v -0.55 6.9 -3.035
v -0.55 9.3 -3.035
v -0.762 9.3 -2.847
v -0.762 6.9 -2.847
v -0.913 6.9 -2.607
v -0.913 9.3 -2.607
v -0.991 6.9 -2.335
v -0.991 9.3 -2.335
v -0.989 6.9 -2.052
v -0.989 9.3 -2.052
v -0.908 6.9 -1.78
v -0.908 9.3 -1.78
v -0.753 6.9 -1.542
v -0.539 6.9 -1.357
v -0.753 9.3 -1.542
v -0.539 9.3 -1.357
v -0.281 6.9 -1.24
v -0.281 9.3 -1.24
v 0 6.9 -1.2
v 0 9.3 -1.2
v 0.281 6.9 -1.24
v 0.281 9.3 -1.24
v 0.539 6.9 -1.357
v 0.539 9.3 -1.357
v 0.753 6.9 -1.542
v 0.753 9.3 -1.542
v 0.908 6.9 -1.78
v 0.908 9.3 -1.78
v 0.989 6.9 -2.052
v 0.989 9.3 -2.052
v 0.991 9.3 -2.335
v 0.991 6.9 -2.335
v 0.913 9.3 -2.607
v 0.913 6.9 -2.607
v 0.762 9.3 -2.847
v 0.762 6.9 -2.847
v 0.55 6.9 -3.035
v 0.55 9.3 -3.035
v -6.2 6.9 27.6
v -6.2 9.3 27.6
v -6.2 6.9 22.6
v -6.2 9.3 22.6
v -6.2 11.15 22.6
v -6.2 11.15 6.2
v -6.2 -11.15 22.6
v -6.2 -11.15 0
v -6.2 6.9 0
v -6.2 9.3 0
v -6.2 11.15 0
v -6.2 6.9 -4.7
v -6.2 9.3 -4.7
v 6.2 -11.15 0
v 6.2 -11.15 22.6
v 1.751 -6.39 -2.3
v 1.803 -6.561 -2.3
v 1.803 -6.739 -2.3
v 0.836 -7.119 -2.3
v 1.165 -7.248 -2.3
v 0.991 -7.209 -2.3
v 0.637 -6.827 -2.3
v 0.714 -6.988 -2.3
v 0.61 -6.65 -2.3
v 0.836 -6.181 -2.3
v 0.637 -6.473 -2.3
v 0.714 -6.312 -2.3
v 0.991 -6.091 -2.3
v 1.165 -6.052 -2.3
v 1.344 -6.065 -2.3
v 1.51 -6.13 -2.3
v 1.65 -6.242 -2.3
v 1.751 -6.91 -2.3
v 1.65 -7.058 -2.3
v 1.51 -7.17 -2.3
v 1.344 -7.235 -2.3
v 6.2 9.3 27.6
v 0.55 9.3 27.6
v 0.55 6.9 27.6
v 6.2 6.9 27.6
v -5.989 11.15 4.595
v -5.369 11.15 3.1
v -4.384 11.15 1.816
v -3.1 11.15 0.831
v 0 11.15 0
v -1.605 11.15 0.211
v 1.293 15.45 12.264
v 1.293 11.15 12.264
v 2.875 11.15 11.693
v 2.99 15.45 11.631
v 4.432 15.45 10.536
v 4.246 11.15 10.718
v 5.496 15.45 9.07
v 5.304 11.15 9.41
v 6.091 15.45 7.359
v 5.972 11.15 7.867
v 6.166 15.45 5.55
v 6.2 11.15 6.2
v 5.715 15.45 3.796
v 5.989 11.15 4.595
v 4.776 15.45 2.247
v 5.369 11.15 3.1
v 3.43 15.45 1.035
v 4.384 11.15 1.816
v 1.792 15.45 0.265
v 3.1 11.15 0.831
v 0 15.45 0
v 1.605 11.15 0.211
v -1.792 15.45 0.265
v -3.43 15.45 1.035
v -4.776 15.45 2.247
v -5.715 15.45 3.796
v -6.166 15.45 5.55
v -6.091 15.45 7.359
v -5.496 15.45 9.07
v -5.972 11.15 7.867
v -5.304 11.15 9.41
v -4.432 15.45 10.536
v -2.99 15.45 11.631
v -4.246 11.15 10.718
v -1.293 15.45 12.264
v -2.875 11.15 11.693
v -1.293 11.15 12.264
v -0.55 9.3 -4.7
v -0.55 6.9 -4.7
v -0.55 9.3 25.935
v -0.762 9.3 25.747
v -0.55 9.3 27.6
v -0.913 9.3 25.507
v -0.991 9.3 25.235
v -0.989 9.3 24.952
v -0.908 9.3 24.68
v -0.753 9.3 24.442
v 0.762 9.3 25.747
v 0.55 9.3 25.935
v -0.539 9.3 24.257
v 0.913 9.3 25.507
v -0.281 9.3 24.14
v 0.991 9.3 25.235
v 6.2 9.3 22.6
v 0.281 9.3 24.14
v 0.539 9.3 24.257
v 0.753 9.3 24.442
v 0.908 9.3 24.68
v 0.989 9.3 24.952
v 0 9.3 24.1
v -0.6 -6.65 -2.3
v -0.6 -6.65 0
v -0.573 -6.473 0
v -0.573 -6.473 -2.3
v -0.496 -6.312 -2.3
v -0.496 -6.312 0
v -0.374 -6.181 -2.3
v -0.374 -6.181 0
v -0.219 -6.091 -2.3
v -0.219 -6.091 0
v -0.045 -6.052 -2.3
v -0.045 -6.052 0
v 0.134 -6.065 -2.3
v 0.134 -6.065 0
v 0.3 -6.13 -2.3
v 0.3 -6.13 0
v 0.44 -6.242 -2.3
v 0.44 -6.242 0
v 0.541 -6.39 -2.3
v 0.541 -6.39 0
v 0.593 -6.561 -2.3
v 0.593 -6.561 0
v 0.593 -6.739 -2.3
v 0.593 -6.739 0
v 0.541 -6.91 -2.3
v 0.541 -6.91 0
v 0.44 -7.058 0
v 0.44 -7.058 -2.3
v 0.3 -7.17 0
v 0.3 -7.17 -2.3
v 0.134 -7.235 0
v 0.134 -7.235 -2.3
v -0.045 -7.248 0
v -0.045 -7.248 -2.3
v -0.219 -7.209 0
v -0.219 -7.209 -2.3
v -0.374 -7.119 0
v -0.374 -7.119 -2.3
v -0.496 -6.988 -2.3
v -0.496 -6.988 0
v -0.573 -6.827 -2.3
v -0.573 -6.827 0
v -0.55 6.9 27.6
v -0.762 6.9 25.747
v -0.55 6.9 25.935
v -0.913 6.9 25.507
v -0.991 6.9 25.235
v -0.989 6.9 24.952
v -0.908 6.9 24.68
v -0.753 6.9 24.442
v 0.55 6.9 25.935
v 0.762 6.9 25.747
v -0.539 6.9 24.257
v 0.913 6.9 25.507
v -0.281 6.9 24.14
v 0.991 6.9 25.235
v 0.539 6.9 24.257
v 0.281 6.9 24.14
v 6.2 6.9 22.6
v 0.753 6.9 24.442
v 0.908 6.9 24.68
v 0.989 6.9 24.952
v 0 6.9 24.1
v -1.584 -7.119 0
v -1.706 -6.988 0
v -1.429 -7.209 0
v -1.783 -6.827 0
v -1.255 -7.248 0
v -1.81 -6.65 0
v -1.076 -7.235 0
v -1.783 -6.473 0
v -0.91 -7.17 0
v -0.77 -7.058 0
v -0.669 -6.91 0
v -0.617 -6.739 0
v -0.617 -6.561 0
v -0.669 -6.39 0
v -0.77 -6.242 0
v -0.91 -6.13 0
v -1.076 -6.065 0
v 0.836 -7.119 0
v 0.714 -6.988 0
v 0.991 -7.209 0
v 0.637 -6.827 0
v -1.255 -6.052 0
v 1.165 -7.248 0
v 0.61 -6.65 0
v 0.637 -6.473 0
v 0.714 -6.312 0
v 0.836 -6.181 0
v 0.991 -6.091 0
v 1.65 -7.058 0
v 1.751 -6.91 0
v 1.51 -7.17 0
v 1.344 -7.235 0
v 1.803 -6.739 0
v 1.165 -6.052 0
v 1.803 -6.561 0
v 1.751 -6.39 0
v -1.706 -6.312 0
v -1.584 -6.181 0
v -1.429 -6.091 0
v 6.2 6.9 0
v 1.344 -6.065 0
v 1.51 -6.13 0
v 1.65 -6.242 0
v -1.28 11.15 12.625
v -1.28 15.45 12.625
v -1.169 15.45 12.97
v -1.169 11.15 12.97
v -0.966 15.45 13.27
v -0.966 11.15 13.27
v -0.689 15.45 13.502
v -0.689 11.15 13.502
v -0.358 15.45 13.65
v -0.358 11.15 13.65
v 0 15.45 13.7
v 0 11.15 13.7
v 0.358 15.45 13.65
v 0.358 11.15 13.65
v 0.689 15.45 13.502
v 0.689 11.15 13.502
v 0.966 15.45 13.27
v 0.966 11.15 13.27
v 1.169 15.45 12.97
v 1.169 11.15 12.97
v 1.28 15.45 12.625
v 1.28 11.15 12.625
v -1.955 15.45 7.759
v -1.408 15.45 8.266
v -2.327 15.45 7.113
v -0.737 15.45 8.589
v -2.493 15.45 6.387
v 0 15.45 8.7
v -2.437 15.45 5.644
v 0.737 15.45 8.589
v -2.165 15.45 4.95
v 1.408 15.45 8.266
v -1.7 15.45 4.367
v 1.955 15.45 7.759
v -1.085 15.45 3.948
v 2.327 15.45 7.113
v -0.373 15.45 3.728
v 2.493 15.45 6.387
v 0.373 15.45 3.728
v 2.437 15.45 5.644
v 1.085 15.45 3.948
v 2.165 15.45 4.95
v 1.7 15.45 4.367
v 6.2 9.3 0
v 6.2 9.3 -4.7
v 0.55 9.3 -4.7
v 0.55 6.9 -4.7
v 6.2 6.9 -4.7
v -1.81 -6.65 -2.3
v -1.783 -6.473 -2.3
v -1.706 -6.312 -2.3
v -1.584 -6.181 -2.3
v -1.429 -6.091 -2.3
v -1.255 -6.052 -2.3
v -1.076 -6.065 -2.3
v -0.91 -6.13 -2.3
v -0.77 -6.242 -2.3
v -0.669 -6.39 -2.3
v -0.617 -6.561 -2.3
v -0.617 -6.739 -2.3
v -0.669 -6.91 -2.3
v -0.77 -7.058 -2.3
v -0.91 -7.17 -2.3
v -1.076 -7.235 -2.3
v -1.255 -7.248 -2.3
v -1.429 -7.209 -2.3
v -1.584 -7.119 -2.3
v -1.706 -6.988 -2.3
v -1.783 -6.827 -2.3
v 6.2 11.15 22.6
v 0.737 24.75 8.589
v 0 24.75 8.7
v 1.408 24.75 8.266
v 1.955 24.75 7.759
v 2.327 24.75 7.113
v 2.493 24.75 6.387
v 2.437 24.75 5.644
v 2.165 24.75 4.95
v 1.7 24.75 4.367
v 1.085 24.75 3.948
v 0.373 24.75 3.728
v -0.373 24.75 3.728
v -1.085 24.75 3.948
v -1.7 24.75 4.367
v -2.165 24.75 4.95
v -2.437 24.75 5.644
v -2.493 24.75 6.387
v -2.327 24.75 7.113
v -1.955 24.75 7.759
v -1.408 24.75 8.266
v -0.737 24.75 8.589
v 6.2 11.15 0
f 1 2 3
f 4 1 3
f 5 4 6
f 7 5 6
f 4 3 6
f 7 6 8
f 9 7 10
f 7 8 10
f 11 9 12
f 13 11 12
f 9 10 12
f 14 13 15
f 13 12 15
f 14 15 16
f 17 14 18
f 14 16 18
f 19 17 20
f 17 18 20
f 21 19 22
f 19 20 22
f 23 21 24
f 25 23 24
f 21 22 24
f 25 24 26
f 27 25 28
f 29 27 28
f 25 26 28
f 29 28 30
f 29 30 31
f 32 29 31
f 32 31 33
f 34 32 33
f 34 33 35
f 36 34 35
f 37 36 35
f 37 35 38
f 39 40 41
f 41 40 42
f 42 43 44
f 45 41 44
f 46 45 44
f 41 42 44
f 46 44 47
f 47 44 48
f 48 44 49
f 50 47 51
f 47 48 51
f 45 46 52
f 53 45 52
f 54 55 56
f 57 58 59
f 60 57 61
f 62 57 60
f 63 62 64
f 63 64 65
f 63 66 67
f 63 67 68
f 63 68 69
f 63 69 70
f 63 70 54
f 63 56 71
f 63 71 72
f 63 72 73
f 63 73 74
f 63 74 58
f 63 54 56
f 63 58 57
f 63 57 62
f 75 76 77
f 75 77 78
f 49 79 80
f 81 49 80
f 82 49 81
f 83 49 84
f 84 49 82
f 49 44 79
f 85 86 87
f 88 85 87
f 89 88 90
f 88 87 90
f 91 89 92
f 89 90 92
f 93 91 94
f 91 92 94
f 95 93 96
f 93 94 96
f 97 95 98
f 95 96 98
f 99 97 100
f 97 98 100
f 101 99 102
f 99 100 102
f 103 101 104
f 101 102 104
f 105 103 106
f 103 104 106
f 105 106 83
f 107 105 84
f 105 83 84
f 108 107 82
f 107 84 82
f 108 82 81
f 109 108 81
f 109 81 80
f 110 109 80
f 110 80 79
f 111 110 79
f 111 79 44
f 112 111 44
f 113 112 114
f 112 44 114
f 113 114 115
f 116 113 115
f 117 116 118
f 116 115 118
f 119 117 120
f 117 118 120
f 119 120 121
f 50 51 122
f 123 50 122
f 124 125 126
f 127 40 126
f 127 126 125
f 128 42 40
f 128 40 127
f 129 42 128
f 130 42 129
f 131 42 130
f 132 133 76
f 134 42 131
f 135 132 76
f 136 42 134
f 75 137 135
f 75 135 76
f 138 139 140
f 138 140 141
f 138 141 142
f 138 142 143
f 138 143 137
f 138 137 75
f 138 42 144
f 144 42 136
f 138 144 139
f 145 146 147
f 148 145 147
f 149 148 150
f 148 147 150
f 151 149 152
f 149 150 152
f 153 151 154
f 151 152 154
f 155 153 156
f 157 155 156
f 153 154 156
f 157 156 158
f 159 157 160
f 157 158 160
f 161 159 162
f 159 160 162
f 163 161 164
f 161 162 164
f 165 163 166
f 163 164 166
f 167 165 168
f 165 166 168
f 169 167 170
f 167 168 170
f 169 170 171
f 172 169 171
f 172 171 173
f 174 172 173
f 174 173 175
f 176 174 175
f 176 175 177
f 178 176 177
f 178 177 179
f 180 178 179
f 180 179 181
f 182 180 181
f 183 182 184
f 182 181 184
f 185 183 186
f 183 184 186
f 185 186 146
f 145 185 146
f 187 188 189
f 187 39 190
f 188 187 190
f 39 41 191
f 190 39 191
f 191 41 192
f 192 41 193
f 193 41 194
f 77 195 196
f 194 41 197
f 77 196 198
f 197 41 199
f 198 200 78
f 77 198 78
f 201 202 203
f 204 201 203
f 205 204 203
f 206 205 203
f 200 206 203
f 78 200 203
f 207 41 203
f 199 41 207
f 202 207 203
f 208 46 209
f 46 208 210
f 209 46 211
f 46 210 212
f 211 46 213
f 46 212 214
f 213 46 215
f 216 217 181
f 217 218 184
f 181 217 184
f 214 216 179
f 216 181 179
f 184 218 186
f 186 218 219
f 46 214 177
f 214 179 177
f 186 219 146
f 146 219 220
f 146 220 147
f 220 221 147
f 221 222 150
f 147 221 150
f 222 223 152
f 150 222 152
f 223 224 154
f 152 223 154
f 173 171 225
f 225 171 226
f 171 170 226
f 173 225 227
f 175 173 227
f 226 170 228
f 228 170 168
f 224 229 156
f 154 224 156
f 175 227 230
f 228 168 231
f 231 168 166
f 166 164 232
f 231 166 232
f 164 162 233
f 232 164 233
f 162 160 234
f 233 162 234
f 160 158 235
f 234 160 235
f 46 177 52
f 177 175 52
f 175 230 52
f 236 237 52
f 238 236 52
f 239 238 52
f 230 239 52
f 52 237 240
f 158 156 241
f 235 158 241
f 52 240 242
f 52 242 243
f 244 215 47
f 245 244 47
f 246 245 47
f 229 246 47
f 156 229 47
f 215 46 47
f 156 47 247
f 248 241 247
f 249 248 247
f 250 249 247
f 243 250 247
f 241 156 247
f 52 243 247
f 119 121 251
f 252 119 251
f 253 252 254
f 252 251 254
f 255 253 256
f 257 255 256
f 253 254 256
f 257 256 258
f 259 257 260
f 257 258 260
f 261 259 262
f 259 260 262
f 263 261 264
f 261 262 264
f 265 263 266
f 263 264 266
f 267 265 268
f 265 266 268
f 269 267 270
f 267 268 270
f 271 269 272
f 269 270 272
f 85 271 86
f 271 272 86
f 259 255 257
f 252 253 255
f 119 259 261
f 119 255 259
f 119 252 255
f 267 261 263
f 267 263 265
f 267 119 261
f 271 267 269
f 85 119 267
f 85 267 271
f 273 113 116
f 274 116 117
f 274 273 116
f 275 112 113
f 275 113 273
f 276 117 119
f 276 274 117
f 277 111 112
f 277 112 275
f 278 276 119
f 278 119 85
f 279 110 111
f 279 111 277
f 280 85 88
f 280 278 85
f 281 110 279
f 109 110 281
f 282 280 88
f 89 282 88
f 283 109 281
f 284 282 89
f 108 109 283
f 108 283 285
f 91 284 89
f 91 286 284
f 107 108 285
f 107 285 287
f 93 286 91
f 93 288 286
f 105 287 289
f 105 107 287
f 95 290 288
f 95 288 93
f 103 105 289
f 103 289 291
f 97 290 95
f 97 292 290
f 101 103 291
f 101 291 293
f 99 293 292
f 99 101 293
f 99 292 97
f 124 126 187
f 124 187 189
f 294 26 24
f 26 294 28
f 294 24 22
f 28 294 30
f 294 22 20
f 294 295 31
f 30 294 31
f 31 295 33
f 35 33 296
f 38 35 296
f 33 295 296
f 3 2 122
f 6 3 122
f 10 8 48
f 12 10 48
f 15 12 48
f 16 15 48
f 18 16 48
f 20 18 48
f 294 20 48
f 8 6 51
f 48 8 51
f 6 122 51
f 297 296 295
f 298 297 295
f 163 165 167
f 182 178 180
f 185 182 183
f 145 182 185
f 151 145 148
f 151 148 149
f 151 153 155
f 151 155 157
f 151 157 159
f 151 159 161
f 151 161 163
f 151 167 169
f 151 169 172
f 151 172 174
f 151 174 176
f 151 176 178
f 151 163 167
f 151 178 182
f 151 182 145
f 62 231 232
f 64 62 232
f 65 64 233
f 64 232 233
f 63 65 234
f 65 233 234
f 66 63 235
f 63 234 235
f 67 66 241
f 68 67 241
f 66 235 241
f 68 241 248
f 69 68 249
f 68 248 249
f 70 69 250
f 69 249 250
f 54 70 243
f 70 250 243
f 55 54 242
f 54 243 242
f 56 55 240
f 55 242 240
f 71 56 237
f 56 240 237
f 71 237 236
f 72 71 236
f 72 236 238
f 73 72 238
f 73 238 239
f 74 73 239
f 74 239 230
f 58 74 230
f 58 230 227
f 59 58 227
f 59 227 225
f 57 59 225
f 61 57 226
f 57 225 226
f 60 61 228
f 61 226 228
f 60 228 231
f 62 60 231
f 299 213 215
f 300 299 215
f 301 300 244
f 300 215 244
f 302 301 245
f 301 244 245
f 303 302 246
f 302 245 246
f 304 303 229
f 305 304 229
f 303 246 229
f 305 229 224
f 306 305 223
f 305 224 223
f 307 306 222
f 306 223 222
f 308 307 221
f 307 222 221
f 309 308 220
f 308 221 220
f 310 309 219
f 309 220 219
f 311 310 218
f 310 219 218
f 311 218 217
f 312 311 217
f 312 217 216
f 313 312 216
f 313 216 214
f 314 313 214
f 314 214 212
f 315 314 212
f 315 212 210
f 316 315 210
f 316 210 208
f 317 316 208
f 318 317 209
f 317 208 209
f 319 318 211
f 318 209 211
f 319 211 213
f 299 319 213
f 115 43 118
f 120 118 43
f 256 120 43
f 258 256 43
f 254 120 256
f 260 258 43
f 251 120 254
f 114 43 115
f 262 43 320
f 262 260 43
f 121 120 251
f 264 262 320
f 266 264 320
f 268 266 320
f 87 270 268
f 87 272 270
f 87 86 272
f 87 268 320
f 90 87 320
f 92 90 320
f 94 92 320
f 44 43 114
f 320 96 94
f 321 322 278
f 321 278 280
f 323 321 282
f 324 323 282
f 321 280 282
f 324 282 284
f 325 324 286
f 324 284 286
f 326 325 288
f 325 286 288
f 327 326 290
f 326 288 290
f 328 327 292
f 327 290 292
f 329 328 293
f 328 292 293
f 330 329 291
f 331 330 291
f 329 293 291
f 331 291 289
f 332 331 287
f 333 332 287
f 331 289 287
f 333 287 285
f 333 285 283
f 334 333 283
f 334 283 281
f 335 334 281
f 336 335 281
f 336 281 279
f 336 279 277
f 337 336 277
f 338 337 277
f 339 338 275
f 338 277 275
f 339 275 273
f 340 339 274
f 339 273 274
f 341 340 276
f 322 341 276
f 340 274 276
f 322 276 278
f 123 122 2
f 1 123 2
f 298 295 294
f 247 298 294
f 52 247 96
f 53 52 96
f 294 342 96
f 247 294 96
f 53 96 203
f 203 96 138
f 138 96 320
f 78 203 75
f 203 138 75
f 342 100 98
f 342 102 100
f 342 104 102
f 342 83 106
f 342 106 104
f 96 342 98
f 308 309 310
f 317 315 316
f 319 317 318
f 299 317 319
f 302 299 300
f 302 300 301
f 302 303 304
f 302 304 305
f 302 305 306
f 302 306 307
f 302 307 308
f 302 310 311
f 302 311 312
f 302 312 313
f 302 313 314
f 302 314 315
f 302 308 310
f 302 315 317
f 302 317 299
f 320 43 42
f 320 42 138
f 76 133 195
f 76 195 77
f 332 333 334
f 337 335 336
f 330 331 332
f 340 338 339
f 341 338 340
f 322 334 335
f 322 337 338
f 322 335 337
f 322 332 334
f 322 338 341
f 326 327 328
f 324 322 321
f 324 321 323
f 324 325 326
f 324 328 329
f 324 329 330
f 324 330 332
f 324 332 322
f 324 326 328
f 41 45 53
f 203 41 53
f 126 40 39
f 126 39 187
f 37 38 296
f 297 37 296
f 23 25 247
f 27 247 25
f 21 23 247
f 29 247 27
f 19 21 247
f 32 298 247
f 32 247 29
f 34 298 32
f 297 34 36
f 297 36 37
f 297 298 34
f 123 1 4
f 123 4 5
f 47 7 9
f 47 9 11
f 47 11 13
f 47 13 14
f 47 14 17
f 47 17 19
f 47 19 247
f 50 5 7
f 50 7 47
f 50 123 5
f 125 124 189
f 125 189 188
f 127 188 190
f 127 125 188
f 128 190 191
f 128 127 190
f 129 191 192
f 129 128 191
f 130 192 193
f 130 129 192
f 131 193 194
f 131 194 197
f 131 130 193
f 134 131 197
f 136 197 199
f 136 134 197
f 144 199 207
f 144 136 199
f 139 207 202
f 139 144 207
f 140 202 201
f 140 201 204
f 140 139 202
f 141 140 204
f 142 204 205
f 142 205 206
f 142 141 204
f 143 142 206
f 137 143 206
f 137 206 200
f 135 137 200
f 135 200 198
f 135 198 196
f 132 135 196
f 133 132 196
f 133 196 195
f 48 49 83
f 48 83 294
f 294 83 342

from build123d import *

# Parameters (mm, degrees)
SKETCH_1_W      = 12.4
SKETCH_1_H      = 22.3
EXTRUDE_1_DEPTH = 22.6
EXTRUDE_2_DEPTH = 4.3
SKETCH_3_R      = 2.5
EXTRUDE_3_DEPTH = 9.3
EXTRUDE_4_DEPTH = 2.4
SKETCH_5_R      = 0.6
EXTRUDE_5_DEPTH = 2.3


with BuildPart() as part:
    # 草图1 → 凸台-拉伸1 (new body)
    with BuildSketch(Plane.XY):
        Rectangle(SKETCH_1_W, SKETCH_1_H)
    extrude(amount=EXTRUDE_1_DEPTH)

    # 草图2 → 凸台-拉伸2 (add)
    with BuildSketch(Plane(origin=(0, 11.15, 0), x_dir=(1, 0, 0), z_dir=(0, 1, 0))):
        with BuildLine():
            ThreePointArc((1.29283601, -12.263709677), (0, 0), (-1.29283601, -12.263709677))
            ThreePointArc((-1.29283601, -12.263709677), (0, -13.7), (1.29283601, -12.263709677))
        make_face()
    extrude(amount=EXTRUDE_2_DEPTH)

    # 草图3 → 凸台-拉伸3 (add)
    with BuildSketch(Plane(origin=(0, 15.45, 0), x_dir=(1, 0, 0), z_dir=(0, 1, 0))):
        with Locations(Location((0, -6.2, 0), (0, 0, 270))):
            Circle(SKETCH_3_R)
    extrude(amount=EXTRUDE_3_DEPTH)

    # 草图4 → 凸台-拉伸4 (add)
    with BuildSketch(Plane(origin=(0, 9.3, 0), x_dir=(1, 0, 0), z_dir=(0, 1, 0))):
        with BuildLine():
            Line((6.2, -22.6), (-6.2, -22.6))
            Line((-6.2, -22.6), (-6.2, -27.6))
            Line((-6.2, -27.6), (-0.55, -27.6))
            Line((-0.55, -27.6), (-0.55, -25.935164654))
            ThreePointArc((-0.55, -25.935164654), (0, -24.1), (0.55, -25.935164654))
            Line((0.55, -25.935164654), (0.55, -27.6))
            Line((0.55, -27.6), (6.2, -27.6))
            Line((6.2, -27.6), (6.2, -22.6))
        make_face()
        with BuildLine():
            Line((0.55, 3.035164654), (0.55, 4.7))
            Line((0.55, 4.7), (6.2, 4.7))
            Line((6.2, 4.7), (6.2, -0.3))
            Line((6.2, -0.3), (-6.2, -0.3))
            Line((-6.2, -0.3), (-6.2, 4.7))
            Line((-6.2, 4.7), (-0.55, 4.7))
            Line((-0.55, 4.7), (-0.55, 3.035164654))
            ThreePointArc((-0.55, 3.035164654), (0, 1.2), (0.55, 3.035164654))
        make_face()
    extrude(amount=-EXTRUDE_4_DEPTH)

    # 草图5 → 凸台-拉伸5 (add)
    with BuildSketch(Plane(origin=(0, 0, 0), x_dir=(-1, 0, 0), z_dir=(0, 0, -1))):
        with Locations((0, -6.65)):
            Circle(SKETCH_5_R)
        with Locations((-1.21, -6.65)):
            Circle(SKETCH_5_R)
        with Locations((1.21, -6.65)):
            Circle(SKETCH_5_R)
    extrude(amount=EXTRUDE_5_DEPTH)


solid = part.part
